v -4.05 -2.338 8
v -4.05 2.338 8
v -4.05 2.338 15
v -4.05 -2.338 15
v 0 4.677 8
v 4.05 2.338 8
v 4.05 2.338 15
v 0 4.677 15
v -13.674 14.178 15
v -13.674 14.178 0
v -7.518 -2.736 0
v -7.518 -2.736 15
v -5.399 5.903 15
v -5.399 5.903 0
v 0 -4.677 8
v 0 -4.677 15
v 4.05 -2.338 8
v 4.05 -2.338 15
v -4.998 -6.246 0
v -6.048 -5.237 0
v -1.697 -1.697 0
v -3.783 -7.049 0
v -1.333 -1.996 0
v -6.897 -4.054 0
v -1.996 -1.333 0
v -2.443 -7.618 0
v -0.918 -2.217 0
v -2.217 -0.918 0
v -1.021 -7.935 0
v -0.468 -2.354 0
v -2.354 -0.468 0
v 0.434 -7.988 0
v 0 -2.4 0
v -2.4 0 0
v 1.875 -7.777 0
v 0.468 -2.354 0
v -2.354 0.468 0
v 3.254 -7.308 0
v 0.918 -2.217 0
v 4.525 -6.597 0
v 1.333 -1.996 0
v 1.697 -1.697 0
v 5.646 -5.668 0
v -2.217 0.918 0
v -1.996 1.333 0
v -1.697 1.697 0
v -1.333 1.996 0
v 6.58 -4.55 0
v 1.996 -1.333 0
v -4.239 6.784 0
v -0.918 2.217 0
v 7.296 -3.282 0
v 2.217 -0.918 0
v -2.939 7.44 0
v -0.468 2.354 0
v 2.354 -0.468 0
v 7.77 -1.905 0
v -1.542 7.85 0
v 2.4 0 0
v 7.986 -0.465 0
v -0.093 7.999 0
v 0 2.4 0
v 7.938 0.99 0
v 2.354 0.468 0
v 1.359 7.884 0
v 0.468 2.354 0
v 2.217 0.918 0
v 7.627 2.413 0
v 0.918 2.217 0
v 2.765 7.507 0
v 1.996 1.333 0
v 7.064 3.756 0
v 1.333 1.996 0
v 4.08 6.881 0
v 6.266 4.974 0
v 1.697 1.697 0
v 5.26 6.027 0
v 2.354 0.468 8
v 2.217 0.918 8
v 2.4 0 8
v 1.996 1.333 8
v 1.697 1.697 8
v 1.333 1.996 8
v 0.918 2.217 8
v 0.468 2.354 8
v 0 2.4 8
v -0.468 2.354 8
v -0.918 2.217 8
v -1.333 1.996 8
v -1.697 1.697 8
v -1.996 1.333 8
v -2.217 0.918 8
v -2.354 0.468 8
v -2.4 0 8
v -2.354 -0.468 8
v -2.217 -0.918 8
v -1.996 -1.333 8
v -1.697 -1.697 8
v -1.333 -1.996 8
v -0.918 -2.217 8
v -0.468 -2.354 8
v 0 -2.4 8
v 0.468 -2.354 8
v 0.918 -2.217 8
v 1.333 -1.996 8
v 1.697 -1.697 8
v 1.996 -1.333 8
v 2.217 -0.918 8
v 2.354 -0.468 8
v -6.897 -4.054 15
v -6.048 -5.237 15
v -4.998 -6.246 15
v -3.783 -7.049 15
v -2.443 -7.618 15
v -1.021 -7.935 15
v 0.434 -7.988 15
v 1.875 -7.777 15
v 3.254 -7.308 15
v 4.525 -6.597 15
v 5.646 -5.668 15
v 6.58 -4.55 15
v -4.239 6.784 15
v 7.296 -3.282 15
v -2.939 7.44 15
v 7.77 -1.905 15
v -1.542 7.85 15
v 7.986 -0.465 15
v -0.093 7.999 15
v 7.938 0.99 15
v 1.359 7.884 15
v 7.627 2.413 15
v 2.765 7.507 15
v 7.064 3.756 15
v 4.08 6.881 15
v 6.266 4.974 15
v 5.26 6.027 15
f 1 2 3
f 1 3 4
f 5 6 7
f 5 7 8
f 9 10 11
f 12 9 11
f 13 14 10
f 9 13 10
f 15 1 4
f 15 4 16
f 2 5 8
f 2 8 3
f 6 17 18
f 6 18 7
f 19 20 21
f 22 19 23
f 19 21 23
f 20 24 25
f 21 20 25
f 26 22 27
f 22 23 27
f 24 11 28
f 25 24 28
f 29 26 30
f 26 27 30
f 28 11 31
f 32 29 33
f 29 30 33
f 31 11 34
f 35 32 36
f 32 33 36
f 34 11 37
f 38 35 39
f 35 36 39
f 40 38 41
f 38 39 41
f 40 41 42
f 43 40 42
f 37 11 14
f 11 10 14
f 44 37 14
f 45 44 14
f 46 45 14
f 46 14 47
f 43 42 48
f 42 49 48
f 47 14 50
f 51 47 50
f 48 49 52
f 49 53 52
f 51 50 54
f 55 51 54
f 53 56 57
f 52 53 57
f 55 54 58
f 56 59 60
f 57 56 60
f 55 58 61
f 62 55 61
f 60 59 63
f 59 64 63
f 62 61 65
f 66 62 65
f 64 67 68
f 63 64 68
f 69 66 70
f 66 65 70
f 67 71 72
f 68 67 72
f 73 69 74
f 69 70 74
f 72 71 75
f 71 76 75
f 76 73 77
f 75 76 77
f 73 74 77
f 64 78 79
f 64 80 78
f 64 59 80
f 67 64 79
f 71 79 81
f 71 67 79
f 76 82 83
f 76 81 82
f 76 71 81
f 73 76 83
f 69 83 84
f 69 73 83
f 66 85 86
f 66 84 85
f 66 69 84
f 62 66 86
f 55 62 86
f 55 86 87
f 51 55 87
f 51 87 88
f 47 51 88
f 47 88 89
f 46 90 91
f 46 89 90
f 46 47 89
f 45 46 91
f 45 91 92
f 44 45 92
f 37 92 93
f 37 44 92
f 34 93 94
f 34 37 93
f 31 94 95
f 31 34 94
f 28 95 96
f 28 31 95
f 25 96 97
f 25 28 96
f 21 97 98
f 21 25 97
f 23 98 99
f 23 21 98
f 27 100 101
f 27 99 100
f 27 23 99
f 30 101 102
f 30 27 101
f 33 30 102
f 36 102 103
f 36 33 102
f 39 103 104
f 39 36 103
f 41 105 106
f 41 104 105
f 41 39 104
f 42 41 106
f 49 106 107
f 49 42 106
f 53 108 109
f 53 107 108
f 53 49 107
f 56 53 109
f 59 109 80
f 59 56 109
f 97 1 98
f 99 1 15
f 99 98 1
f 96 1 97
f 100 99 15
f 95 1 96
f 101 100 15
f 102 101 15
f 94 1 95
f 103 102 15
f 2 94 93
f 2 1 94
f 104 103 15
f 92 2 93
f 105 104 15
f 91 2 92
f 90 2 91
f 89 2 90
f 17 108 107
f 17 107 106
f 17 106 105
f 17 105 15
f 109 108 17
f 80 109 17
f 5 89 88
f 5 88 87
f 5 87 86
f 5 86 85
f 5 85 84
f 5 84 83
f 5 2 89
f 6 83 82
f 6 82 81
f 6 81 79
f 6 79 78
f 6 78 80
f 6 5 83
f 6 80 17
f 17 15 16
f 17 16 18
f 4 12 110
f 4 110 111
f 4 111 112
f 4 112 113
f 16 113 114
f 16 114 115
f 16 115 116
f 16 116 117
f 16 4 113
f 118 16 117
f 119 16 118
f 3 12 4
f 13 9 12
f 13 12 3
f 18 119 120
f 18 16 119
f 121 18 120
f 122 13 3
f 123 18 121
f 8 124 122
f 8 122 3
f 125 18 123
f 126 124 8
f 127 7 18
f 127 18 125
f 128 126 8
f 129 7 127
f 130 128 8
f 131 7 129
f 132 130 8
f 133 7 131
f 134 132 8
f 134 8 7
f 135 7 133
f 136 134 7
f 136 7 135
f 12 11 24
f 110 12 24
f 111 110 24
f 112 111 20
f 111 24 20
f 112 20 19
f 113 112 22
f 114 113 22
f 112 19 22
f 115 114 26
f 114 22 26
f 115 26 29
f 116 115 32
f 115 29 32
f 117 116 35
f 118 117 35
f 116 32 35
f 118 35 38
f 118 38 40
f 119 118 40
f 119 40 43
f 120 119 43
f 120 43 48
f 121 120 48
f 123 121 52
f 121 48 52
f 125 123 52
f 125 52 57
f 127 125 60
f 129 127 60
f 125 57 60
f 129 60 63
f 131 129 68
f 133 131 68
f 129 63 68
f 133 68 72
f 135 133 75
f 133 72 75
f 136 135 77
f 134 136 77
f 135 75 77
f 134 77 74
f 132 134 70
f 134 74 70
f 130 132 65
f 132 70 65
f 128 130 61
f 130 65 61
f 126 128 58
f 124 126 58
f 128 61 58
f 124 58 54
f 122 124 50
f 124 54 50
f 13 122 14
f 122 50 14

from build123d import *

# Parameters (mm, degrees)
CLONE027_ROLL_ANGLE = 90
PAD014_DEPTH        = 10
PAD006_DEPTH        = 15


with BuildPart() as clone_of_m5countersinkslot002:
    # Sketch013 → Revolution (revolve)
    with BuildSketch(Plane.XY):
        Polygon((0, 20), (5, 20), (5, 0), (2.4, -2.6), (2.4, -45), (0, -45), align=None)
    revolve(axis=Axis((0, 0, 0), (0, 1, 0)))


with BuildPart() as clone_of_m5countersinkslot002_1:
    # Clone027 roll: moved
    add(clone_of_m5countersinkslot002.part.rotate(Axis((0, 0, 0), (1, 0, 0)), CLONE027_ROLL_ANGLE))


with BuildPart() as clone_of_m5countersinkslot002_2:
    # Clone027 placement: moved
    add(clone_of_m5countersinkslot002_1.part.moved(Location((0, 0, 26))))


with BuildPart() as clone_of_din934slot001:
    # Sketch014 → Pad014 (new body)
    with BuildSketch(Plane.XY):
        Polygon((4.05, -2.338269), (4.05, 2.338269), (0, 4.676537), (-4.05, 2.338269), (-4.05, -2.338269), (0, -4.676537), align=None)
    extrude(amount=PAD014_DEPTH)


with BuildPart() as clone_of_din934slot001_1:
    # Clone026 placement: moved
    add(clone_of_din934slot001.part.moved(Location((0, 0, 8))))


with BuildPart() as normalhinge:
    # Clone2D001 → Pad006 (new body)
    with BuildSketch(Plane.XY):
        with BuildLine():
            ThreePointArc((-7.517553, -2.736129), (7.769812, -1.90526), (-5.399017, 5.903441))
            Line((-5.399017, 5.903441), (-13.673915, 14.178338))
            Line((-13.673915, 14.178338), (-7.517553, -2.736129))
        make_face()
    extrude(amount=PAD006_DEPTH)

    # Cut017: cut Clone of DIN934Slot001
    add(clone_of_din934slot001_1.part, mode=Mode.SUBTRACT)

    # Cut007: cut Clone of M5CounterSinkSlot002
    add(clone_of_m5countersinkslot002_2.part, mode=Mode.SUBTRACT)


solid = normalhinge.part
